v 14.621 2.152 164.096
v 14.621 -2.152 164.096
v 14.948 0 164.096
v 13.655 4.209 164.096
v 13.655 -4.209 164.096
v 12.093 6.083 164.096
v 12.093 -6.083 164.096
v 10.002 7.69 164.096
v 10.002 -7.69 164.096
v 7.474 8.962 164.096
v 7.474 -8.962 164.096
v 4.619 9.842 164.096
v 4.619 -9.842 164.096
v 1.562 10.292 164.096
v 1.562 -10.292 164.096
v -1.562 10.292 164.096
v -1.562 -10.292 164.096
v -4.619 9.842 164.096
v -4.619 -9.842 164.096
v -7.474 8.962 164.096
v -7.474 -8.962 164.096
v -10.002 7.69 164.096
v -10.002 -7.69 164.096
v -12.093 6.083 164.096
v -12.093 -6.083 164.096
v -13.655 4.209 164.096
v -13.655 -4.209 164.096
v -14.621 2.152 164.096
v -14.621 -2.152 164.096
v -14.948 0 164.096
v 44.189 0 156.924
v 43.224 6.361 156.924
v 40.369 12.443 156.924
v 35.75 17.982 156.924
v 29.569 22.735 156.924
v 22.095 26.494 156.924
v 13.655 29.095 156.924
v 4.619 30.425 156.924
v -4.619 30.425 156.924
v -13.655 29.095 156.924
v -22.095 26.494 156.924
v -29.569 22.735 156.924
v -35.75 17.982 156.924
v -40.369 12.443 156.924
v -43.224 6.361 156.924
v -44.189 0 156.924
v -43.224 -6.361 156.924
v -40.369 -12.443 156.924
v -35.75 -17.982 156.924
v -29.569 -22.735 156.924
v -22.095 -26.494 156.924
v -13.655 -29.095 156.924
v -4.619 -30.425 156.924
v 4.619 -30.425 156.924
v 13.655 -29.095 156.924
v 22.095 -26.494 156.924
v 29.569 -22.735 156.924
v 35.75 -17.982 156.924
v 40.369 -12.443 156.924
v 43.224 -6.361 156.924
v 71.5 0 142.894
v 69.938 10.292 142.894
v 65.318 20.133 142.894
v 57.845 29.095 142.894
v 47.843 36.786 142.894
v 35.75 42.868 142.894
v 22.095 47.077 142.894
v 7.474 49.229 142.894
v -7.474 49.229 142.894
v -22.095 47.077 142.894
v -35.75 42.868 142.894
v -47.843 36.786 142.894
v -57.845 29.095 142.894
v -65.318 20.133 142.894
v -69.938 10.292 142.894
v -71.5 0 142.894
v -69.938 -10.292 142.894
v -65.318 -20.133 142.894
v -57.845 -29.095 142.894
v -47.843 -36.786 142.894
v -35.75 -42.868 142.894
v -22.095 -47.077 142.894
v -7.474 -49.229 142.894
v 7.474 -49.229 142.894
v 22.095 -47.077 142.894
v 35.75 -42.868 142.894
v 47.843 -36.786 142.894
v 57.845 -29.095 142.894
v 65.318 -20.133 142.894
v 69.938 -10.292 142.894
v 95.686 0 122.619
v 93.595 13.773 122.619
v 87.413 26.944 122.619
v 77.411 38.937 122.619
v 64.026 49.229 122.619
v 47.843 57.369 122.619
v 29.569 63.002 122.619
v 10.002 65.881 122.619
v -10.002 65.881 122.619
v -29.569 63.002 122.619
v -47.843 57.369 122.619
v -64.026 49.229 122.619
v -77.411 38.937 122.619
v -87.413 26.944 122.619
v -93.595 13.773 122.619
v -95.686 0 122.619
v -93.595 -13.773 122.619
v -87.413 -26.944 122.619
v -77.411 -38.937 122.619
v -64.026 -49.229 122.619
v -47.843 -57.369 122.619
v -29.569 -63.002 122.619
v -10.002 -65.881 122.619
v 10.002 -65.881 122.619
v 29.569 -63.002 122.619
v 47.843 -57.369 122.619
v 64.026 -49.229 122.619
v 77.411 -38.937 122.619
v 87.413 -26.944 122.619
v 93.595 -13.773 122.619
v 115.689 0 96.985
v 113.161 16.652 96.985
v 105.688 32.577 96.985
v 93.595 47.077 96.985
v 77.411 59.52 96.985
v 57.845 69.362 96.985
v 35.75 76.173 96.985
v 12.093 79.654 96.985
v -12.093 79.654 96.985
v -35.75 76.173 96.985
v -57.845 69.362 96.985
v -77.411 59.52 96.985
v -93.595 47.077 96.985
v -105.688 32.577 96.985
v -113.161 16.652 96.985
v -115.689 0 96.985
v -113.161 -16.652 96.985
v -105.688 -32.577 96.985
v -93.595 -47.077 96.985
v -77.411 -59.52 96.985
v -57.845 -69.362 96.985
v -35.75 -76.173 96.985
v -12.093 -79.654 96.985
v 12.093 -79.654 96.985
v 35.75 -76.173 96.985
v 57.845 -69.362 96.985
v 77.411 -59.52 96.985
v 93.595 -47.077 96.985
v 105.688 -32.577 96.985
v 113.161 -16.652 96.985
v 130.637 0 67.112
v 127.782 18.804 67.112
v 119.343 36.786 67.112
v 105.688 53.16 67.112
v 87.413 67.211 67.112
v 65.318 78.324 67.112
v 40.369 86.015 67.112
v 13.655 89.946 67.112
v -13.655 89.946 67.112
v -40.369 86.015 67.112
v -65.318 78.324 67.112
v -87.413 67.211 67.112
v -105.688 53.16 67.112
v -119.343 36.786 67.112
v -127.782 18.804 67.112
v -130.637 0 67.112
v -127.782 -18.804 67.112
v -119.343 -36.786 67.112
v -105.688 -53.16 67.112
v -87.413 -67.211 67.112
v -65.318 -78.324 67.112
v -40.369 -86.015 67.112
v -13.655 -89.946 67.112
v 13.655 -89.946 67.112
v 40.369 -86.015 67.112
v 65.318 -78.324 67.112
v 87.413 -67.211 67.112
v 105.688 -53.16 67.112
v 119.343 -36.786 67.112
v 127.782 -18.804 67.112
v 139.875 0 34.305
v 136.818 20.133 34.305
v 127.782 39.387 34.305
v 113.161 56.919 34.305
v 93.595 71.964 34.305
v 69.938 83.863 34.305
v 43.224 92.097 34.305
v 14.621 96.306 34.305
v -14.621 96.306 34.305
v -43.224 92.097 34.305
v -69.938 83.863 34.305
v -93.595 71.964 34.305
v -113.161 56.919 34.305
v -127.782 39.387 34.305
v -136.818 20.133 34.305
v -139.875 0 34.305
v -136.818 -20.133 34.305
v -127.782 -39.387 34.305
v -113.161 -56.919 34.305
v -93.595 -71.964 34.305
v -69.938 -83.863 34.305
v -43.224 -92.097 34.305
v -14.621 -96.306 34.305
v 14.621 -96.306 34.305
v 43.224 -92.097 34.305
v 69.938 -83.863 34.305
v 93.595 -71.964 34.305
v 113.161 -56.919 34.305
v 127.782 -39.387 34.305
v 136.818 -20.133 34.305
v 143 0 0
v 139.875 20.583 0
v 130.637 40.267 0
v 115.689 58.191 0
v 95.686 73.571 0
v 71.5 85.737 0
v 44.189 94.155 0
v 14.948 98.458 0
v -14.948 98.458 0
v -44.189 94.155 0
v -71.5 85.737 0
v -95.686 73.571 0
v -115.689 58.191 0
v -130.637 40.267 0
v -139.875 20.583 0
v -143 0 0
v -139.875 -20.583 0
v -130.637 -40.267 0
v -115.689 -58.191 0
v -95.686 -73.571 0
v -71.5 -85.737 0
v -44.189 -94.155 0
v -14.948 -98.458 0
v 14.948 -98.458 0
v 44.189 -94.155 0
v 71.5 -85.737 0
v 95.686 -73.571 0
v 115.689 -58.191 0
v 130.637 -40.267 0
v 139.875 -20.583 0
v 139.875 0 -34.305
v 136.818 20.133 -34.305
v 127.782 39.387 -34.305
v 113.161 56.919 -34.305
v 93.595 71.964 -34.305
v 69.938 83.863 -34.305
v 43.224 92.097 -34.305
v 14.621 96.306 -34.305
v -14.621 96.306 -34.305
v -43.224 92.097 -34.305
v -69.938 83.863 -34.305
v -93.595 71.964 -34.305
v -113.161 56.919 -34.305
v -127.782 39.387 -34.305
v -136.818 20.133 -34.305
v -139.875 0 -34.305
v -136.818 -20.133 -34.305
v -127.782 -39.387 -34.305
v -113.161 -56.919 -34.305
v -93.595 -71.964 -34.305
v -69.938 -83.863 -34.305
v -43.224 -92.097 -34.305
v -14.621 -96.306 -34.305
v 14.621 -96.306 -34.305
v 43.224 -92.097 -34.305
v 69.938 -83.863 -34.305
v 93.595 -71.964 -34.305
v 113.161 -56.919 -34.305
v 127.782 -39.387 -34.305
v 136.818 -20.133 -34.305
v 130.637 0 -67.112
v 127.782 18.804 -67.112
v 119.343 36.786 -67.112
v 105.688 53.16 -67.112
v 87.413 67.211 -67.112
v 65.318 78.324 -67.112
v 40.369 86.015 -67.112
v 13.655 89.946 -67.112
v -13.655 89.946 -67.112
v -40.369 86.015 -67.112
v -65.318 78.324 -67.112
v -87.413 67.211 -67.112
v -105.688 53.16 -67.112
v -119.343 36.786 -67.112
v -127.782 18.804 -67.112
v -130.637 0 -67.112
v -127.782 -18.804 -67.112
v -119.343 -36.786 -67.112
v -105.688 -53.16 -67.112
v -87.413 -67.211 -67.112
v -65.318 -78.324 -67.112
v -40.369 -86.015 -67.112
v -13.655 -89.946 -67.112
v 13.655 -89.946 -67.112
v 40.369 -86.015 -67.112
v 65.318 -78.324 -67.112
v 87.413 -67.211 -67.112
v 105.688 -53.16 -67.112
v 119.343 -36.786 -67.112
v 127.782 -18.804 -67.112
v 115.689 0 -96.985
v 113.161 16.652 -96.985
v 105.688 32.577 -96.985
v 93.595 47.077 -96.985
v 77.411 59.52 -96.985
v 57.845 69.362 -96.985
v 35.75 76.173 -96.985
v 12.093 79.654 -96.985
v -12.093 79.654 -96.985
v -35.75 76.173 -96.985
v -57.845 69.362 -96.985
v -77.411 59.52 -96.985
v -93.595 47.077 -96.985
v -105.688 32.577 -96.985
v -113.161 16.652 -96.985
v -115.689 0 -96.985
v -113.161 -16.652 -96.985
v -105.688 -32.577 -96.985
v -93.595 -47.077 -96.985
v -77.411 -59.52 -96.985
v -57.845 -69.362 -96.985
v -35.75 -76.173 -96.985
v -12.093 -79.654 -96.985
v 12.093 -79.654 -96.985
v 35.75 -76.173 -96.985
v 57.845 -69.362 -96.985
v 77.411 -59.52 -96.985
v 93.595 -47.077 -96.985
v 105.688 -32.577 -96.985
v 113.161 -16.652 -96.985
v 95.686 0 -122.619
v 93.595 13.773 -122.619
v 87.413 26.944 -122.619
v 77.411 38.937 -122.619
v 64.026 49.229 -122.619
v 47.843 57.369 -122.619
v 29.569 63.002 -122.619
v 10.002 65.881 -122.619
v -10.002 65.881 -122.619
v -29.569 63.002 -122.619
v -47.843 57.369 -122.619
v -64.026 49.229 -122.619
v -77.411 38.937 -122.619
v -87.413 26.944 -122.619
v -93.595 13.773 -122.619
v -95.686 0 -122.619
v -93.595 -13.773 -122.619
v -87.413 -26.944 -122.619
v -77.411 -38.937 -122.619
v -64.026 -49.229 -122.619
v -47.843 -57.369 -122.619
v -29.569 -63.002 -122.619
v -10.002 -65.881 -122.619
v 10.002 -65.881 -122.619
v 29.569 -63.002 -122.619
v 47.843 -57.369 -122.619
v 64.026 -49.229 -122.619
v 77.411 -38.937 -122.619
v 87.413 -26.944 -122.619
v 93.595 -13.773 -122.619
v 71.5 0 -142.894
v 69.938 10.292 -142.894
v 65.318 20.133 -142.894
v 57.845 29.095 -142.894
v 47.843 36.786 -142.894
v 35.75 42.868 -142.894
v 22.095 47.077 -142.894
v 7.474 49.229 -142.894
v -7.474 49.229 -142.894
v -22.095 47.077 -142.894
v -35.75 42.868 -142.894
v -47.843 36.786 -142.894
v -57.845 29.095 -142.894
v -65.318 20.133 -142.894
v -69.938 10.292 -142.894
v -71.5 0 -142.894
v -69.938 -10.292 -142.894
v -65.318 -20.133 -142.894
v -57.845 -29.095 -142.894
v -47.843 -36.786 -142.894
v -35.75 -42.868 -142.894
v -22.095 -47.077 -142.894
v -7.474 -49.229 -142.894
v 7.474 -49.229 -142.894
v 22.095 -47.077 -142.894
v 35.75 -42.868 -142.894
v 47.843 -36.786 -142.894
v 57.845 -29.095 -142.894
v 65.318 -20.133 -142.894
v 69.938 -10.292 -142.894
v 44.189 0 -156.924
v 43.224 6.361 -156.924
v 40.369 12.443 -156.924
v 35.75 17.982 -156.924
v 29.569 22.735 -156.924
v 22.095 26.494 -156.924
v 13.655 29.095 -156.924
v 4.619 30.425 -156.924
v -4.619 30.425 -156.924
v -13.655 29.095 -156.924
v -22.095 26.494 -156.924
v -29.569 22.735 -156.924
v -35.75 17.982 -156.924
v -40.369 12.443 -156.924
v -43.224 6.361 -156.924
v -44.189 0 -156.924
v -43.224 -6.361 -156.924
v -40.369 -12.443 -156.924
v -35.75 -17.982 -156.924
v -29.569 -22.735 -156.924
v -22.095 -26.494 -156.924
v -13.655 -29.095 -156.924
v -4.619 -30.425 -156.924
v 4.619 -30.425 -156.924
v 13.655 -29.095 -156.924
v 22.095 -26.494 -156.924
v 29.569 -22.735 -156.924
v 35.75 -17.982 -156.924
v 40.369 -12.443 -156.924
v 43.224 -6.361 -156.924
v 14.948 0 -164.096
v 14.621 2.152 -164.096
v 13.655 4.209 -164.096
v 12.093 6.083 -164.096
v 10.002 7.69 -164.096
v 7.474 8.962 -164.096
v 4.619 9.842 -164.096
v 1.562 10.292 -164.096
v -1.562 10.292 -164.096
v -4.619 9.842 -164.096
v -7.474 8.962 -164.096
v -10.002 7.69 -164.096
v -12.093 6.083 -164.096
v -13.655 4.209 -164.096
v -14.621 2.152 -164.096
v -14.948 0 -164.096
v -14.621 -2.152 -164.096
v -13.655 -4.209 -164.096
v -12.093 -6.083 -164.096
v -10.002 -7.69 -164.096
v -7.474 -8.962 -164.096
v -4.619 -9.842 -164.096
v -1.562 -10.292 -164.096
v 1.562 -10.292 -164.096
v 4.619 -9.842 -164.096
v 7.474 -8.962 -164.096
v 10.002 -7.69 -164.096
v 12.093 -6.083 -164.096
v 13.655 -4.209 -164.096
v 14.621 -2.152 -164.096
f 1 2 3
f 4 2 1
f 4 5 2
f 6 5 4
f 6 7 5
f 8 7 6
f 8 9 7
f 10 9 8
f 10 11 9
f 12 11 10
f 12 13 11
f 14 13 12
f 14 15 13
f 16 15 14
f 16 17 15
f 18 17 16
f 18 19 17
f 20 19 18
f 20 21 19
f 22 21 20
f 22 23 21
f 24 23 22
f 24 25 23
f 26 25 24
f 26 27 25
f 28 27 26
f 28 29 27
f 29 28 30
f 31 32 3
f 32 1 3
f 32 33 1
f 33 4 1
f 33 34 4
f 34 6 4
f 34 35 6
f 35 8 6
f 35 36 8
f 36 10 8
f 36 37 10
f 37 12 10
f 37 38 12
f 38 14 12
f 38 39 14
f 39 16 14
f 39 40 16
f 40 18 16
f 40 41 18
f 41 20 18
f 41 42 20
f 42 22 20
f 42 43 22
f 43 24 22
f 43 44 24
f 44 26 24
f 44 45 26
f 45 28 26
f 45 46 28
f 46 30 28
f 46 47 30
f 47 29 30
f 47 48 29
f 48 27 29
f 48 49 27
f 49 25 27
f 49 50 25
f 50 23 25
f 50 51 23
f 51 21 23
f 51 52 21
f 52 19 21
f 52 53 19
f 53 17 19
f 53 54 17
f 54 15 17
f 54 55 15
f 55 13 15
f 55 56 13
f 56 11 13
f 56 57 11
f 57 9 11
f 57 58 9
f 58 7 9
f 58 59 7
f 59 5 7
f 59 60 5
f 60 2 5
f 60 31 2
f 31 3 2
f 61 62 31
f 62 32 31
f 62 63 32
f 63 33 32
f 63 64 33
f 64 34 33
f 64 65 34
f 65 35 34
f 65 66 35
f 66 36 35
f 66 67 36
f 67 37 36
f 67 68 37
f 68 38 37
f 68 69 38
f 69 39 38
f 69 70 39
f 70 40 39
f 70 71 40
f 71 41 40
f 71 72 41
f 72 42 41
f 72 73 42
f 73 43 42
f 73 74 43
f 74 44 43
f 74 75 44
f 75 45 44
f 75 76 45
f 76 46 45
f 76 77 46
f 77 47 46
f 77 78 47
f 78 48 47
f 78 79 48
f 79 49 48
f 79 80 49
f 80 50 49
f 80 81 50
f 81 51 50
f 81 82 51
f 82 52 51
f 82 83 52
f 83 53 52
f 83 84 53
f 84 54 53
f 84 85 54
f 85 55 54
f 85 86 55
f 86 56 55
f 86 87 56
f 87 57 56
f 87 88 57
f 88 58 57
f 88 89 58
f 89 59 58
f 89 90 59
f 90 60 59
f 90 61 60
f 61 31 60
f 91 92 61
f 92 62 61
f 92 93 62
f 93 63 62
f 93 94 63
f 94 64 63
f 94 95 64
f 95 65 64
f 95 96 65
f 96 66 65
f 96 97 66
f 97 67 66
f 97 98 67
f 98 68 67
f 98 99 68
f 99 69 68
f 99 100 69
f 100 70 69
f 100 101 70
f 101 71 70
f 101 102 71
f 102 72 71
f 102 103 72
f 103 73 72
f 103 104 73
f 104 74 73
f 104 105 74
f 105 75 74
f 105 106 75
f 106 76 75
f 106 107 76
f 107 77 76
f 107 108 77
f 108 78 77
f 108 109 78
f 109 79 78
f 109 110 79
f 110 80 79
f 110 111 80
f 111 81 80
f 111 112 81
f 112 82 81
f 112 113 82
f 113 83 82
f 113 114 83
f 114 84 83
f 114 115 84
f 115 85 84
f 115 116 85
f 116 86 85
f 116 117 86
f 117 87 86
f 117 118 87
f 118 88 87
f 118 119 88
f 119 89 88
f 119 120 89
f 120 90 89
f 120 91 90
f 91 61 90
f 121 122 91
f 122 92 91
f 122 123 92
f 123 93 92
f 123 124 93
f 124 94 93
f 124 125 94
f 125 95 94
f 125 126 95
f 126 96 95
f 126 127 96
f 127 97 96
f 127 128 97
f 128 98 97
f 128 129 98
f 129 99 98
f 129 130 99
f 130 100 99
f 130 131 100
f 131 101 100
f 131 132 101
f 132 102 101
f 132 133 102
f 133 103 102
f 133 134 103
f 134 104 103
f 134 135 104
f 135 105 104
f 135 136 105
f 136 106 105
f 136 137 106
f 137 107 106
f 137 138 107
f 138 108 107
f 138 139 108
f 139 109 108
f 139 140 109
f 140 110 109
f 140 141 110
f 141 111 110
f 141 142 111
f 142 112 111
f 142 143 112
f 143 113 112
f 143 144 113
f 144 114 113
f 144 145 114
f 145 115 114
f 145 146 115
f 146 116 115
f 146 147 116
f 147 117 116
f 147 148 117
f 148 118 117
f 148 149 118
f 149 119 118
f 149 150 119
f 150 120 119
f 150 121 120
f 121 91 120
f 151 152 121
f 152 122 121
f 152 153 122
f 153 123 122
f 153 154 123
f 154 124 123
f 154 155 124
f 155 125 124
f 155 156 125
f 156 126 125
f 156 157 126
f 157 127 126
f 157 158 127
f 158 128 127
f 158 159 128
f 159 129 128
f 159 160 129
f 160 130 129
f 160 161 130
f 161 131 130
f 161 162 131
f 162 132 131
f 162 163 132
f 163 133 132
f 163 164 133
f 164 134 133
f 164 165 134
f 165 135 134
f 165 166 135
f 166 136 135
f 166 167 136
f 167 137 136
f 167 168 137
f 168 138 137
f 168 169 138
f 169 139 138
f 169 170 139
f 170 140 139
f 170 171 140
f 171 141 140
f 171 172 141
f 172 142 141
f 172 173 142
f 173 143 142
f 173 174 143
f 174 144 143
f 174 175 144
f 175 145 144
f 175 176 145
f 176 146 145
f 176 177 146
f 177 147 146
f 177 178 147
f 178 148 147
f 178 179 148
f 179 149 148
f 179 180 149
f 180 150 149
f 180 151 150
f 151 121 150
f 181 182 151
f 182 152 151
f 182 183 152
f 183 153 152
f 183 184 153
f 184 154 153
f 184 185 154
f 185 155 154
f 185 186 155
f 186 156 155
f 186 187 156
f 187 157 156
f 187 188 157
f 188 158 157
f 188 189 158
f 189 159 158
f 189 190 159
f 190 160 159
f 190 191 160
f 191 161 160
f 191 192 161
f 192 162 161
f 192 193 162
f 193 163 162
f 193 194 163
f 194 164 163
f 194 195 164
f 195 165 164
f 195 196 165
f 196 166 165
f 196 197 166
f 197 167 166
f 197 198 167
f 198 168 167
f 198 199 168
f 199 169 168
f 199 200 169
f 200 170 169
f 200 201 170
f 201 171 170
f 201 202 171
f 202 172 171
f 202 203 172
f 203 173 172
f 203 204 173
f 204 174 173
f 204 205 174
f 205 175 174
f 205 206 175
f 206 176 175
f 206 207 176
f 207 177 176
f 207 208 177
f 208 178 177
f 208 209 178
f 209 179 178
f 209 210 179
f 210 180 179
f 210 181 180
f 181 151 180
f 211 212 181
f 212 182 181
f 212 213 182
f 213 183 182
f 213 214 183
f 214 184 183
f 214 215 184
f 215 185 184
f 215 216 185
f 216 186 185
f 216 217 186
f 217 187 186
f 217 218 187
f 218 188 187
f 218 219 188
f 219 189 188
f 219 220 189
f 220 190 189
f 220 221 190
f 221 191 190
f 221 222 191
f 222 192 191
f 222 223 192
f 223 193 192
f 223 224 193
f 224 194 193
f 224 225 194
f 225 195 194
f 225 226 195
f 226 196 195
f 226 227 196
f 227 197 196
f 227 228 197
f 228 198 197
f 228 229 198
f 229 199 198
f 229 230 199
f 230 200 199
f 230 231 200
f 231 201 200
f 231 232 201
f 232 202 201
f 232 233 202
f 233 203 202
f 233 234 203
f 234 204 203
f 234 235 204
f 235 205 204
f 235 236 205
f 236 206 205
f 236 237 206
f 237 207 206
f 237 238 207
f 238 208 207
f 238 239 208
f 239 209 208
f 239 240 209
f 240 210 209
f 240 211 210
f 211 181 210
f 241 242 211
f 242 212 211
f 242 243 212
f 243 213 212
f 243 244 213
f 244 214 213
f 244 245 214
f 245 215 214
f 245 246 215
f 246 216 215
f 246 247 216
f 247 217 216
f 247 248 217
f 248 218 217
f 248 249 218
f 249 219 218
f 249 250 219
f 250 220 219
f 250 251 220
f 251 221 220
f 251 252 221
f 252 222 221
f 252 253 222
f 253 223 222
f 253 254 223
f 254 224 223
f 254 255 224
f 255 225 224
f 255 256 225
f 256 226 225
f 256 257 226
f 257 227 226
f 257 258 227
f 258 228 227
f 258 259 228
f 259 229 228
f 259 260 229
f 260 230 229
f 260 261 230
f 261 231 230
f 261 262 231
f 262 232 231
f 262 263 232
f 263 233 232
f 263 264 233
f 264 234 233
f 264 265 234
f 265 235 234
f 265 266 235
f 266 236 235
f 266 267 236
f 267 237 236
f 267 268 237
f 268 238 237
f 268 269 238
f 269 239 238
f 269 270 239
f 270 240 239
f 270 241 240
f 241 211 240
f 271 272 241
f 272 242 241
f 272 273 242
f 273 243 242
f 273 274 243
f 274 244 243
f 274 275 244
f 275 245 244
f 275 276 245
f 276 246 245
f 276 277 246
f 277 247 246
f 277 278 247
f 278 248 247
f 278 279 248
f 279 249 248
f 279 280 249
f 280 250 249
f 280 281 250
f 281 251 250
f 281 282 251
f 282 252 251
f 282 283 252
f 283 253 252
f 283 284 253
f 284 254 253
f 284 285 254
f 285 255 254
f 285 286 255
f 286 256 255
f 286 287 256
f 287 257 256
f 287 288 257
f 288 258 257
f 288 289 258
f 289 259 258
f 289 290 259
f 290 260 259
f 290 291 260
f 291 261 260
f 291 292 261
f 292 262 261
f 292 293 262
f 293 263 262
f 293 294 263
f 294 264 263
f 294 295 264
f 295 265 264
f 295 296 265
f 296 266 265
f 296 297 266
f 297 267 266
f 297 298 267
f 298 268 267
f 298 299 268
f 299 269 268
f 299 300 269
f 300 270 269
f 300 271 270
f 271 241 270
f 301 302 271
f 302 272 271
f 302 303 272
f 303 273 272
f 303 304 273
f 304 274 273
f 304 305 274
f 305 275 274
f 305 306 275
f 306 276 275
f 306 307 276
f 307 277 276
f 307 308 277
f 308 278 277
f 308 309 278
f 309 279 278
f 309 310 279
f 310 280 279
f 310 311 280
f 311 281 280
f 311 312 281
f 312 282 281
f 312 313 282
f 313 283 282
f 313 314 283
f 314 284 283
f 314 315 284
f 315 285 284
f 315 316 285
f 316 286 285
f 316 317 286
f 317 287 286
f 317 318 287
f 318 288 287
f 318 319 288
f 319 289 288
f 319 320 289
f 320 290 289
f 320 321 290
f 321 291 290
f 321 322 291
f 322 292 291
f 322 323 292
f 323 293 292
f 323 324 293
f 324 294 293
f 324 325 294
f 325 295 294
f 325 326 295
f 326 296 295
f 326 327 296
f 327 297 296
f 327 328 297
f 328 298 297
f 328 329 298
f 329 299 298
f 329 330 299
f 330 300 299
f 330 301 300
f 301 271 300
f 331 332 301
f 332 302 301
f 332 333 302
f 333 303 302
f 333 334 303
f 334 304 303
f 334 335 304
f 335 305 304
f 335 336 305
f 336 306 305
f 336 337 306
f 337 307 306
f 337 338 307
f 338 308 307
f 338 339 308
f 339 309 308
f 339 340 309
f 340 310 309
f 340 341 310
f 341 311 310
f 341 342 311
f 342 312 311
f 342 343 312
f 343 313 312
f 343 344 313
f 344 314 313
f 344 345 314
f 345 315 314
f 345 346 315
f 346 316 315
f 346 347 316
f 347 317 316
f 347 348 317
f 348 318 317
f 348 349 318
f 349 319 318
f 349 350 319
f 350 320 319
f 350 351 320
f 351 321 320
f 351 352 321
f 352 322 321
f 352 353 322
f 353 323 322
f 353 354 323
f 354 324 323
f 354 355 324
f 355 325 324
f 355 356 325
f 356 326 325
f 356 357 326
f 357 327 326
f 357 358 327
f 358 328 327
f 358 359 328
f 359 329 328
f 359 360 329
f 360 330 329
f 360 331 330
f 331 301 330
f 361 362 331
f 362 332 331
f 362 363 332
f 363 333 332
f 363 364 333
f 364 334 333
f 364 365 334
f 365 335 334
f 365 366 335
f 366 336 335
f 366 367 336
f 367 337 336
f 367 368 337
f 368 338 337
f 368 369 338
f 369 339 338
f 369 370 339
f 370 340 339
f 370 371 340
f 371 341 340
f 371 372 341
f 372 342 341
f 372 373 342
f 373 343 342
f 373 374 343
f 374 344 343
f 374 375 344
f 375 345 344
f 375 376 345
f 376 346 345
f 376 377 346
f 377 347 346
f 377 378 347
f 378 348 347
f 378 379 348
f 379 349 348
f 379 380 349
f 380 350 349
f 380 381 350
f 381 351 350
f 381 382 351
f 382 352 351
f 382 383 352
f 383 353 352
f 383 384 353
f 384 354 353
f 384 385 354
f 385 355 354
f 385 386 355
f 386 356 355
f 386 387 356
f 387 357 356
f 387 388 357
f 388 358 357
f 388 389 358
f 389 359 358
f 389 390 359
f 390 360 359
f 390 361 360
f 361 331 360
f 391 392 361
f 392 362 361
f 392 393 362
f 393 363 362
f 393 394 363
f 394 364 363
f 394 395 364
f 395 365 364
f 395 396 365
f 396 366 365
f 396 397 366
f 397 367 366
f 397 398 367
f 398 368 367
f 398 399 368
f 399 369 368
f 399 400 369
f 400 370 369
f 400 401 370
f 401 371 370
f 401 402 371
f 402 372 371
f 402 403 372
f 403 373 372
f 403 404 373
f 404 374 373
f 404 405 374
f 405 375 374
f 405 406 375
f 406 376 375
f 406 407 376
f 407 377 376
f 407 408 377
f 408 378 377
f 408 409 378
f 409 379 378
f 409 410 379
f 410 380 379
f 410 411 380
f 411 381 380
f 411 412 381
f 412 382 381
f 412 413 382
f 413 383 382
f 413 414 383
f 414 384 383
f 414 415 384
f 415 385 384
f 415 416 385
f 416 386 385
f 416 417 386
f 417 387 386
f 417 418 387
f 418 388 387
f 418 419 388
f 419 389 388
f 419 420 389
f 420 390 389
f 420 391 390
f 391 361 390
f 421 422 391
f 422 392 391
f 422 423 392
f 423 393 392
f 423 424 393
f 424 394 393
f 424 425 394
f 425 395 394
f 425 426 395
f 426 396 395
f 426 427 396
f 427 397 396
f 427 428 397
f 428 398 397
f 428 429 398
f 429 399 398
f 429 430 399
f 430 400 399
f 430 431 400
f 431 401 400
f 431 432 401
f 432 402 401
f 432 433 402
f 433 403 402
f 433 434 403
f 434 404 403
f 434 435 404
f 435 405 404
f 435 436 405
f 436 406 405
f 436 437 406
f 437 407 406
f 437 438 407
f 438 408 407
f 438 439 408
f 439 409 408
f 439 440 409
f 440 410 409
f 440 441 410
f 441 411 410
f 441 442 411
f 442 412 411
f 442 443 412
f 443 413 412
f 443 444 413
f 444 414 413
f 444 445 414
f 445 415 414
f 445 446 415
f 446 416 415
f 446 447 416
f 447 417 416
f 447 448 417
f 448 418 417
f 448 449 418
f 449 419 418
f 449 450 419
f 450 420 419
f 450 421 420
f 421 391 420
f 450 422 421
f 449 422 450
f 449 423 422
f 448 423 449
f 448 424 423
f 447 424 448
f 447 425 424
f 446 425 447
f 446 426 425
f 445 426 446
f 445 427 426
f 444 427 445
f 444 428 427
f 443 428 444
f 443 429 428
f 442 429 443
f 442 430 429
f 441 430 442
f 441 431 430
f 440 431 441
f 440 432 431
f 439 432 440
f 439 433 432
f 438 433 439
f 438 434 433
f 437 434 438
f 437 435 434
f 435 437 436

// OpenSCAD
// Generated by SolidPython 1.0.1 on 2020-07-29 00:46:50


scale(v = [13, 9, 15]) {
	sphere(r = 11);
}
/***********************************************
*********      SolidPython code:      **********
************************************************
 
# import packages: SolidPython
from solid import *
from solid.utils import *
from itertools import chain, combinations, permutations


class Resize:

    def __init__(self, scad_file):
        self.scad_file = scad_file
        #self.scad_file = import_scad(scad_file)
        # cone/cylinder param:
        self.r1 = 0
        self.r2 = 0
        self.h = 0
        # rectangular prism param:
        self.w = 0
        self.l = 0
        # ellipse param:
        self.r = 0

    # import OpenScad code (file name corresponds to shape)


    # classify shape + parameters
    def assign(self, param1, param2, param3):
        if self.scad_file == 'cone.scad':
            self.r1 = param1
            self.r2 = param2
            self.h = param3
        elif self.scad_file == 'cylinder.scad':
            self.r1 = param1
            self.r2 = param2
            self.h = param3
        elif self.scad_file == 'rectangularPrism.scad':
            self.h = param1
            self.l = param2
            self.w = param3
        else:
            self.r = param1
            self.h = param2

    # resize parameters
    def iterate(self):
        x = range(3, 20, 2)
        i = 1
        if self.scad_file == 'cone.scad':
            tempList = list(permutations(x, 2))
            for temp in tempList:
                param1 = temp[0]
                param2 = temp[1]
                filepath = 'produced_scad_files/' + 'cone' + str(param1) + '_' + str(param2) + '_' + '.scad'
                scad_render_to_file(cylinder(h=param1, r1=param2, r2=0), filepath)

        elif self.scad_file == 'cylinder.scad':
            tempList = list(permutations(x, 3))
            for temp in tempList:
                param1 = temp[0]
                param2 = temp[1]
                filepath = 'produced_scad_files/' + 'cylinder' + str(param1) + '_' + str(param2) + '_' + '.scad'
                scad_render_to_file(cylinder(h=param1, r1=param2, r2=param2), filepath)

        elif self.scad_file == 'rectangularPrism.scad':
            tempList = list(permutations(x, 3))
            for temp in tempList:
                param1 = temp[0]
                param2 = temp[1]
                param3 = temp[2]
                filepath = 'produced_scad_files/' + 'rectangularPrism' + str(param1) + '_' + str(param2) + '_' + str(
                    param3) + '.scad'
                scad_render_to_file(cube(size=(param1, param2, param3)), filepath)

        elif self.scad_file == 'ellipse.scad':
            tempList = list(permutations(x, 4))
            for temp in tempList:
                param1 = temp[0]
                param2 = temp[1]
                param3 = temp[2]
                param4 = temp[3]
                filepath = 'produced_scad_files/' + 'ellipse' + str(param1) + '_' + str(param2) + '_' + str(param3) + '_' + str(param4) + '.scad'
                scad_render_to_file(scale([param1, param2, param3])(sphere(r=param4)), filepath)

    def render_to_scadfile(self):
        scad_render_to_file(scad, 'example.scad') 
 
************************************************/
